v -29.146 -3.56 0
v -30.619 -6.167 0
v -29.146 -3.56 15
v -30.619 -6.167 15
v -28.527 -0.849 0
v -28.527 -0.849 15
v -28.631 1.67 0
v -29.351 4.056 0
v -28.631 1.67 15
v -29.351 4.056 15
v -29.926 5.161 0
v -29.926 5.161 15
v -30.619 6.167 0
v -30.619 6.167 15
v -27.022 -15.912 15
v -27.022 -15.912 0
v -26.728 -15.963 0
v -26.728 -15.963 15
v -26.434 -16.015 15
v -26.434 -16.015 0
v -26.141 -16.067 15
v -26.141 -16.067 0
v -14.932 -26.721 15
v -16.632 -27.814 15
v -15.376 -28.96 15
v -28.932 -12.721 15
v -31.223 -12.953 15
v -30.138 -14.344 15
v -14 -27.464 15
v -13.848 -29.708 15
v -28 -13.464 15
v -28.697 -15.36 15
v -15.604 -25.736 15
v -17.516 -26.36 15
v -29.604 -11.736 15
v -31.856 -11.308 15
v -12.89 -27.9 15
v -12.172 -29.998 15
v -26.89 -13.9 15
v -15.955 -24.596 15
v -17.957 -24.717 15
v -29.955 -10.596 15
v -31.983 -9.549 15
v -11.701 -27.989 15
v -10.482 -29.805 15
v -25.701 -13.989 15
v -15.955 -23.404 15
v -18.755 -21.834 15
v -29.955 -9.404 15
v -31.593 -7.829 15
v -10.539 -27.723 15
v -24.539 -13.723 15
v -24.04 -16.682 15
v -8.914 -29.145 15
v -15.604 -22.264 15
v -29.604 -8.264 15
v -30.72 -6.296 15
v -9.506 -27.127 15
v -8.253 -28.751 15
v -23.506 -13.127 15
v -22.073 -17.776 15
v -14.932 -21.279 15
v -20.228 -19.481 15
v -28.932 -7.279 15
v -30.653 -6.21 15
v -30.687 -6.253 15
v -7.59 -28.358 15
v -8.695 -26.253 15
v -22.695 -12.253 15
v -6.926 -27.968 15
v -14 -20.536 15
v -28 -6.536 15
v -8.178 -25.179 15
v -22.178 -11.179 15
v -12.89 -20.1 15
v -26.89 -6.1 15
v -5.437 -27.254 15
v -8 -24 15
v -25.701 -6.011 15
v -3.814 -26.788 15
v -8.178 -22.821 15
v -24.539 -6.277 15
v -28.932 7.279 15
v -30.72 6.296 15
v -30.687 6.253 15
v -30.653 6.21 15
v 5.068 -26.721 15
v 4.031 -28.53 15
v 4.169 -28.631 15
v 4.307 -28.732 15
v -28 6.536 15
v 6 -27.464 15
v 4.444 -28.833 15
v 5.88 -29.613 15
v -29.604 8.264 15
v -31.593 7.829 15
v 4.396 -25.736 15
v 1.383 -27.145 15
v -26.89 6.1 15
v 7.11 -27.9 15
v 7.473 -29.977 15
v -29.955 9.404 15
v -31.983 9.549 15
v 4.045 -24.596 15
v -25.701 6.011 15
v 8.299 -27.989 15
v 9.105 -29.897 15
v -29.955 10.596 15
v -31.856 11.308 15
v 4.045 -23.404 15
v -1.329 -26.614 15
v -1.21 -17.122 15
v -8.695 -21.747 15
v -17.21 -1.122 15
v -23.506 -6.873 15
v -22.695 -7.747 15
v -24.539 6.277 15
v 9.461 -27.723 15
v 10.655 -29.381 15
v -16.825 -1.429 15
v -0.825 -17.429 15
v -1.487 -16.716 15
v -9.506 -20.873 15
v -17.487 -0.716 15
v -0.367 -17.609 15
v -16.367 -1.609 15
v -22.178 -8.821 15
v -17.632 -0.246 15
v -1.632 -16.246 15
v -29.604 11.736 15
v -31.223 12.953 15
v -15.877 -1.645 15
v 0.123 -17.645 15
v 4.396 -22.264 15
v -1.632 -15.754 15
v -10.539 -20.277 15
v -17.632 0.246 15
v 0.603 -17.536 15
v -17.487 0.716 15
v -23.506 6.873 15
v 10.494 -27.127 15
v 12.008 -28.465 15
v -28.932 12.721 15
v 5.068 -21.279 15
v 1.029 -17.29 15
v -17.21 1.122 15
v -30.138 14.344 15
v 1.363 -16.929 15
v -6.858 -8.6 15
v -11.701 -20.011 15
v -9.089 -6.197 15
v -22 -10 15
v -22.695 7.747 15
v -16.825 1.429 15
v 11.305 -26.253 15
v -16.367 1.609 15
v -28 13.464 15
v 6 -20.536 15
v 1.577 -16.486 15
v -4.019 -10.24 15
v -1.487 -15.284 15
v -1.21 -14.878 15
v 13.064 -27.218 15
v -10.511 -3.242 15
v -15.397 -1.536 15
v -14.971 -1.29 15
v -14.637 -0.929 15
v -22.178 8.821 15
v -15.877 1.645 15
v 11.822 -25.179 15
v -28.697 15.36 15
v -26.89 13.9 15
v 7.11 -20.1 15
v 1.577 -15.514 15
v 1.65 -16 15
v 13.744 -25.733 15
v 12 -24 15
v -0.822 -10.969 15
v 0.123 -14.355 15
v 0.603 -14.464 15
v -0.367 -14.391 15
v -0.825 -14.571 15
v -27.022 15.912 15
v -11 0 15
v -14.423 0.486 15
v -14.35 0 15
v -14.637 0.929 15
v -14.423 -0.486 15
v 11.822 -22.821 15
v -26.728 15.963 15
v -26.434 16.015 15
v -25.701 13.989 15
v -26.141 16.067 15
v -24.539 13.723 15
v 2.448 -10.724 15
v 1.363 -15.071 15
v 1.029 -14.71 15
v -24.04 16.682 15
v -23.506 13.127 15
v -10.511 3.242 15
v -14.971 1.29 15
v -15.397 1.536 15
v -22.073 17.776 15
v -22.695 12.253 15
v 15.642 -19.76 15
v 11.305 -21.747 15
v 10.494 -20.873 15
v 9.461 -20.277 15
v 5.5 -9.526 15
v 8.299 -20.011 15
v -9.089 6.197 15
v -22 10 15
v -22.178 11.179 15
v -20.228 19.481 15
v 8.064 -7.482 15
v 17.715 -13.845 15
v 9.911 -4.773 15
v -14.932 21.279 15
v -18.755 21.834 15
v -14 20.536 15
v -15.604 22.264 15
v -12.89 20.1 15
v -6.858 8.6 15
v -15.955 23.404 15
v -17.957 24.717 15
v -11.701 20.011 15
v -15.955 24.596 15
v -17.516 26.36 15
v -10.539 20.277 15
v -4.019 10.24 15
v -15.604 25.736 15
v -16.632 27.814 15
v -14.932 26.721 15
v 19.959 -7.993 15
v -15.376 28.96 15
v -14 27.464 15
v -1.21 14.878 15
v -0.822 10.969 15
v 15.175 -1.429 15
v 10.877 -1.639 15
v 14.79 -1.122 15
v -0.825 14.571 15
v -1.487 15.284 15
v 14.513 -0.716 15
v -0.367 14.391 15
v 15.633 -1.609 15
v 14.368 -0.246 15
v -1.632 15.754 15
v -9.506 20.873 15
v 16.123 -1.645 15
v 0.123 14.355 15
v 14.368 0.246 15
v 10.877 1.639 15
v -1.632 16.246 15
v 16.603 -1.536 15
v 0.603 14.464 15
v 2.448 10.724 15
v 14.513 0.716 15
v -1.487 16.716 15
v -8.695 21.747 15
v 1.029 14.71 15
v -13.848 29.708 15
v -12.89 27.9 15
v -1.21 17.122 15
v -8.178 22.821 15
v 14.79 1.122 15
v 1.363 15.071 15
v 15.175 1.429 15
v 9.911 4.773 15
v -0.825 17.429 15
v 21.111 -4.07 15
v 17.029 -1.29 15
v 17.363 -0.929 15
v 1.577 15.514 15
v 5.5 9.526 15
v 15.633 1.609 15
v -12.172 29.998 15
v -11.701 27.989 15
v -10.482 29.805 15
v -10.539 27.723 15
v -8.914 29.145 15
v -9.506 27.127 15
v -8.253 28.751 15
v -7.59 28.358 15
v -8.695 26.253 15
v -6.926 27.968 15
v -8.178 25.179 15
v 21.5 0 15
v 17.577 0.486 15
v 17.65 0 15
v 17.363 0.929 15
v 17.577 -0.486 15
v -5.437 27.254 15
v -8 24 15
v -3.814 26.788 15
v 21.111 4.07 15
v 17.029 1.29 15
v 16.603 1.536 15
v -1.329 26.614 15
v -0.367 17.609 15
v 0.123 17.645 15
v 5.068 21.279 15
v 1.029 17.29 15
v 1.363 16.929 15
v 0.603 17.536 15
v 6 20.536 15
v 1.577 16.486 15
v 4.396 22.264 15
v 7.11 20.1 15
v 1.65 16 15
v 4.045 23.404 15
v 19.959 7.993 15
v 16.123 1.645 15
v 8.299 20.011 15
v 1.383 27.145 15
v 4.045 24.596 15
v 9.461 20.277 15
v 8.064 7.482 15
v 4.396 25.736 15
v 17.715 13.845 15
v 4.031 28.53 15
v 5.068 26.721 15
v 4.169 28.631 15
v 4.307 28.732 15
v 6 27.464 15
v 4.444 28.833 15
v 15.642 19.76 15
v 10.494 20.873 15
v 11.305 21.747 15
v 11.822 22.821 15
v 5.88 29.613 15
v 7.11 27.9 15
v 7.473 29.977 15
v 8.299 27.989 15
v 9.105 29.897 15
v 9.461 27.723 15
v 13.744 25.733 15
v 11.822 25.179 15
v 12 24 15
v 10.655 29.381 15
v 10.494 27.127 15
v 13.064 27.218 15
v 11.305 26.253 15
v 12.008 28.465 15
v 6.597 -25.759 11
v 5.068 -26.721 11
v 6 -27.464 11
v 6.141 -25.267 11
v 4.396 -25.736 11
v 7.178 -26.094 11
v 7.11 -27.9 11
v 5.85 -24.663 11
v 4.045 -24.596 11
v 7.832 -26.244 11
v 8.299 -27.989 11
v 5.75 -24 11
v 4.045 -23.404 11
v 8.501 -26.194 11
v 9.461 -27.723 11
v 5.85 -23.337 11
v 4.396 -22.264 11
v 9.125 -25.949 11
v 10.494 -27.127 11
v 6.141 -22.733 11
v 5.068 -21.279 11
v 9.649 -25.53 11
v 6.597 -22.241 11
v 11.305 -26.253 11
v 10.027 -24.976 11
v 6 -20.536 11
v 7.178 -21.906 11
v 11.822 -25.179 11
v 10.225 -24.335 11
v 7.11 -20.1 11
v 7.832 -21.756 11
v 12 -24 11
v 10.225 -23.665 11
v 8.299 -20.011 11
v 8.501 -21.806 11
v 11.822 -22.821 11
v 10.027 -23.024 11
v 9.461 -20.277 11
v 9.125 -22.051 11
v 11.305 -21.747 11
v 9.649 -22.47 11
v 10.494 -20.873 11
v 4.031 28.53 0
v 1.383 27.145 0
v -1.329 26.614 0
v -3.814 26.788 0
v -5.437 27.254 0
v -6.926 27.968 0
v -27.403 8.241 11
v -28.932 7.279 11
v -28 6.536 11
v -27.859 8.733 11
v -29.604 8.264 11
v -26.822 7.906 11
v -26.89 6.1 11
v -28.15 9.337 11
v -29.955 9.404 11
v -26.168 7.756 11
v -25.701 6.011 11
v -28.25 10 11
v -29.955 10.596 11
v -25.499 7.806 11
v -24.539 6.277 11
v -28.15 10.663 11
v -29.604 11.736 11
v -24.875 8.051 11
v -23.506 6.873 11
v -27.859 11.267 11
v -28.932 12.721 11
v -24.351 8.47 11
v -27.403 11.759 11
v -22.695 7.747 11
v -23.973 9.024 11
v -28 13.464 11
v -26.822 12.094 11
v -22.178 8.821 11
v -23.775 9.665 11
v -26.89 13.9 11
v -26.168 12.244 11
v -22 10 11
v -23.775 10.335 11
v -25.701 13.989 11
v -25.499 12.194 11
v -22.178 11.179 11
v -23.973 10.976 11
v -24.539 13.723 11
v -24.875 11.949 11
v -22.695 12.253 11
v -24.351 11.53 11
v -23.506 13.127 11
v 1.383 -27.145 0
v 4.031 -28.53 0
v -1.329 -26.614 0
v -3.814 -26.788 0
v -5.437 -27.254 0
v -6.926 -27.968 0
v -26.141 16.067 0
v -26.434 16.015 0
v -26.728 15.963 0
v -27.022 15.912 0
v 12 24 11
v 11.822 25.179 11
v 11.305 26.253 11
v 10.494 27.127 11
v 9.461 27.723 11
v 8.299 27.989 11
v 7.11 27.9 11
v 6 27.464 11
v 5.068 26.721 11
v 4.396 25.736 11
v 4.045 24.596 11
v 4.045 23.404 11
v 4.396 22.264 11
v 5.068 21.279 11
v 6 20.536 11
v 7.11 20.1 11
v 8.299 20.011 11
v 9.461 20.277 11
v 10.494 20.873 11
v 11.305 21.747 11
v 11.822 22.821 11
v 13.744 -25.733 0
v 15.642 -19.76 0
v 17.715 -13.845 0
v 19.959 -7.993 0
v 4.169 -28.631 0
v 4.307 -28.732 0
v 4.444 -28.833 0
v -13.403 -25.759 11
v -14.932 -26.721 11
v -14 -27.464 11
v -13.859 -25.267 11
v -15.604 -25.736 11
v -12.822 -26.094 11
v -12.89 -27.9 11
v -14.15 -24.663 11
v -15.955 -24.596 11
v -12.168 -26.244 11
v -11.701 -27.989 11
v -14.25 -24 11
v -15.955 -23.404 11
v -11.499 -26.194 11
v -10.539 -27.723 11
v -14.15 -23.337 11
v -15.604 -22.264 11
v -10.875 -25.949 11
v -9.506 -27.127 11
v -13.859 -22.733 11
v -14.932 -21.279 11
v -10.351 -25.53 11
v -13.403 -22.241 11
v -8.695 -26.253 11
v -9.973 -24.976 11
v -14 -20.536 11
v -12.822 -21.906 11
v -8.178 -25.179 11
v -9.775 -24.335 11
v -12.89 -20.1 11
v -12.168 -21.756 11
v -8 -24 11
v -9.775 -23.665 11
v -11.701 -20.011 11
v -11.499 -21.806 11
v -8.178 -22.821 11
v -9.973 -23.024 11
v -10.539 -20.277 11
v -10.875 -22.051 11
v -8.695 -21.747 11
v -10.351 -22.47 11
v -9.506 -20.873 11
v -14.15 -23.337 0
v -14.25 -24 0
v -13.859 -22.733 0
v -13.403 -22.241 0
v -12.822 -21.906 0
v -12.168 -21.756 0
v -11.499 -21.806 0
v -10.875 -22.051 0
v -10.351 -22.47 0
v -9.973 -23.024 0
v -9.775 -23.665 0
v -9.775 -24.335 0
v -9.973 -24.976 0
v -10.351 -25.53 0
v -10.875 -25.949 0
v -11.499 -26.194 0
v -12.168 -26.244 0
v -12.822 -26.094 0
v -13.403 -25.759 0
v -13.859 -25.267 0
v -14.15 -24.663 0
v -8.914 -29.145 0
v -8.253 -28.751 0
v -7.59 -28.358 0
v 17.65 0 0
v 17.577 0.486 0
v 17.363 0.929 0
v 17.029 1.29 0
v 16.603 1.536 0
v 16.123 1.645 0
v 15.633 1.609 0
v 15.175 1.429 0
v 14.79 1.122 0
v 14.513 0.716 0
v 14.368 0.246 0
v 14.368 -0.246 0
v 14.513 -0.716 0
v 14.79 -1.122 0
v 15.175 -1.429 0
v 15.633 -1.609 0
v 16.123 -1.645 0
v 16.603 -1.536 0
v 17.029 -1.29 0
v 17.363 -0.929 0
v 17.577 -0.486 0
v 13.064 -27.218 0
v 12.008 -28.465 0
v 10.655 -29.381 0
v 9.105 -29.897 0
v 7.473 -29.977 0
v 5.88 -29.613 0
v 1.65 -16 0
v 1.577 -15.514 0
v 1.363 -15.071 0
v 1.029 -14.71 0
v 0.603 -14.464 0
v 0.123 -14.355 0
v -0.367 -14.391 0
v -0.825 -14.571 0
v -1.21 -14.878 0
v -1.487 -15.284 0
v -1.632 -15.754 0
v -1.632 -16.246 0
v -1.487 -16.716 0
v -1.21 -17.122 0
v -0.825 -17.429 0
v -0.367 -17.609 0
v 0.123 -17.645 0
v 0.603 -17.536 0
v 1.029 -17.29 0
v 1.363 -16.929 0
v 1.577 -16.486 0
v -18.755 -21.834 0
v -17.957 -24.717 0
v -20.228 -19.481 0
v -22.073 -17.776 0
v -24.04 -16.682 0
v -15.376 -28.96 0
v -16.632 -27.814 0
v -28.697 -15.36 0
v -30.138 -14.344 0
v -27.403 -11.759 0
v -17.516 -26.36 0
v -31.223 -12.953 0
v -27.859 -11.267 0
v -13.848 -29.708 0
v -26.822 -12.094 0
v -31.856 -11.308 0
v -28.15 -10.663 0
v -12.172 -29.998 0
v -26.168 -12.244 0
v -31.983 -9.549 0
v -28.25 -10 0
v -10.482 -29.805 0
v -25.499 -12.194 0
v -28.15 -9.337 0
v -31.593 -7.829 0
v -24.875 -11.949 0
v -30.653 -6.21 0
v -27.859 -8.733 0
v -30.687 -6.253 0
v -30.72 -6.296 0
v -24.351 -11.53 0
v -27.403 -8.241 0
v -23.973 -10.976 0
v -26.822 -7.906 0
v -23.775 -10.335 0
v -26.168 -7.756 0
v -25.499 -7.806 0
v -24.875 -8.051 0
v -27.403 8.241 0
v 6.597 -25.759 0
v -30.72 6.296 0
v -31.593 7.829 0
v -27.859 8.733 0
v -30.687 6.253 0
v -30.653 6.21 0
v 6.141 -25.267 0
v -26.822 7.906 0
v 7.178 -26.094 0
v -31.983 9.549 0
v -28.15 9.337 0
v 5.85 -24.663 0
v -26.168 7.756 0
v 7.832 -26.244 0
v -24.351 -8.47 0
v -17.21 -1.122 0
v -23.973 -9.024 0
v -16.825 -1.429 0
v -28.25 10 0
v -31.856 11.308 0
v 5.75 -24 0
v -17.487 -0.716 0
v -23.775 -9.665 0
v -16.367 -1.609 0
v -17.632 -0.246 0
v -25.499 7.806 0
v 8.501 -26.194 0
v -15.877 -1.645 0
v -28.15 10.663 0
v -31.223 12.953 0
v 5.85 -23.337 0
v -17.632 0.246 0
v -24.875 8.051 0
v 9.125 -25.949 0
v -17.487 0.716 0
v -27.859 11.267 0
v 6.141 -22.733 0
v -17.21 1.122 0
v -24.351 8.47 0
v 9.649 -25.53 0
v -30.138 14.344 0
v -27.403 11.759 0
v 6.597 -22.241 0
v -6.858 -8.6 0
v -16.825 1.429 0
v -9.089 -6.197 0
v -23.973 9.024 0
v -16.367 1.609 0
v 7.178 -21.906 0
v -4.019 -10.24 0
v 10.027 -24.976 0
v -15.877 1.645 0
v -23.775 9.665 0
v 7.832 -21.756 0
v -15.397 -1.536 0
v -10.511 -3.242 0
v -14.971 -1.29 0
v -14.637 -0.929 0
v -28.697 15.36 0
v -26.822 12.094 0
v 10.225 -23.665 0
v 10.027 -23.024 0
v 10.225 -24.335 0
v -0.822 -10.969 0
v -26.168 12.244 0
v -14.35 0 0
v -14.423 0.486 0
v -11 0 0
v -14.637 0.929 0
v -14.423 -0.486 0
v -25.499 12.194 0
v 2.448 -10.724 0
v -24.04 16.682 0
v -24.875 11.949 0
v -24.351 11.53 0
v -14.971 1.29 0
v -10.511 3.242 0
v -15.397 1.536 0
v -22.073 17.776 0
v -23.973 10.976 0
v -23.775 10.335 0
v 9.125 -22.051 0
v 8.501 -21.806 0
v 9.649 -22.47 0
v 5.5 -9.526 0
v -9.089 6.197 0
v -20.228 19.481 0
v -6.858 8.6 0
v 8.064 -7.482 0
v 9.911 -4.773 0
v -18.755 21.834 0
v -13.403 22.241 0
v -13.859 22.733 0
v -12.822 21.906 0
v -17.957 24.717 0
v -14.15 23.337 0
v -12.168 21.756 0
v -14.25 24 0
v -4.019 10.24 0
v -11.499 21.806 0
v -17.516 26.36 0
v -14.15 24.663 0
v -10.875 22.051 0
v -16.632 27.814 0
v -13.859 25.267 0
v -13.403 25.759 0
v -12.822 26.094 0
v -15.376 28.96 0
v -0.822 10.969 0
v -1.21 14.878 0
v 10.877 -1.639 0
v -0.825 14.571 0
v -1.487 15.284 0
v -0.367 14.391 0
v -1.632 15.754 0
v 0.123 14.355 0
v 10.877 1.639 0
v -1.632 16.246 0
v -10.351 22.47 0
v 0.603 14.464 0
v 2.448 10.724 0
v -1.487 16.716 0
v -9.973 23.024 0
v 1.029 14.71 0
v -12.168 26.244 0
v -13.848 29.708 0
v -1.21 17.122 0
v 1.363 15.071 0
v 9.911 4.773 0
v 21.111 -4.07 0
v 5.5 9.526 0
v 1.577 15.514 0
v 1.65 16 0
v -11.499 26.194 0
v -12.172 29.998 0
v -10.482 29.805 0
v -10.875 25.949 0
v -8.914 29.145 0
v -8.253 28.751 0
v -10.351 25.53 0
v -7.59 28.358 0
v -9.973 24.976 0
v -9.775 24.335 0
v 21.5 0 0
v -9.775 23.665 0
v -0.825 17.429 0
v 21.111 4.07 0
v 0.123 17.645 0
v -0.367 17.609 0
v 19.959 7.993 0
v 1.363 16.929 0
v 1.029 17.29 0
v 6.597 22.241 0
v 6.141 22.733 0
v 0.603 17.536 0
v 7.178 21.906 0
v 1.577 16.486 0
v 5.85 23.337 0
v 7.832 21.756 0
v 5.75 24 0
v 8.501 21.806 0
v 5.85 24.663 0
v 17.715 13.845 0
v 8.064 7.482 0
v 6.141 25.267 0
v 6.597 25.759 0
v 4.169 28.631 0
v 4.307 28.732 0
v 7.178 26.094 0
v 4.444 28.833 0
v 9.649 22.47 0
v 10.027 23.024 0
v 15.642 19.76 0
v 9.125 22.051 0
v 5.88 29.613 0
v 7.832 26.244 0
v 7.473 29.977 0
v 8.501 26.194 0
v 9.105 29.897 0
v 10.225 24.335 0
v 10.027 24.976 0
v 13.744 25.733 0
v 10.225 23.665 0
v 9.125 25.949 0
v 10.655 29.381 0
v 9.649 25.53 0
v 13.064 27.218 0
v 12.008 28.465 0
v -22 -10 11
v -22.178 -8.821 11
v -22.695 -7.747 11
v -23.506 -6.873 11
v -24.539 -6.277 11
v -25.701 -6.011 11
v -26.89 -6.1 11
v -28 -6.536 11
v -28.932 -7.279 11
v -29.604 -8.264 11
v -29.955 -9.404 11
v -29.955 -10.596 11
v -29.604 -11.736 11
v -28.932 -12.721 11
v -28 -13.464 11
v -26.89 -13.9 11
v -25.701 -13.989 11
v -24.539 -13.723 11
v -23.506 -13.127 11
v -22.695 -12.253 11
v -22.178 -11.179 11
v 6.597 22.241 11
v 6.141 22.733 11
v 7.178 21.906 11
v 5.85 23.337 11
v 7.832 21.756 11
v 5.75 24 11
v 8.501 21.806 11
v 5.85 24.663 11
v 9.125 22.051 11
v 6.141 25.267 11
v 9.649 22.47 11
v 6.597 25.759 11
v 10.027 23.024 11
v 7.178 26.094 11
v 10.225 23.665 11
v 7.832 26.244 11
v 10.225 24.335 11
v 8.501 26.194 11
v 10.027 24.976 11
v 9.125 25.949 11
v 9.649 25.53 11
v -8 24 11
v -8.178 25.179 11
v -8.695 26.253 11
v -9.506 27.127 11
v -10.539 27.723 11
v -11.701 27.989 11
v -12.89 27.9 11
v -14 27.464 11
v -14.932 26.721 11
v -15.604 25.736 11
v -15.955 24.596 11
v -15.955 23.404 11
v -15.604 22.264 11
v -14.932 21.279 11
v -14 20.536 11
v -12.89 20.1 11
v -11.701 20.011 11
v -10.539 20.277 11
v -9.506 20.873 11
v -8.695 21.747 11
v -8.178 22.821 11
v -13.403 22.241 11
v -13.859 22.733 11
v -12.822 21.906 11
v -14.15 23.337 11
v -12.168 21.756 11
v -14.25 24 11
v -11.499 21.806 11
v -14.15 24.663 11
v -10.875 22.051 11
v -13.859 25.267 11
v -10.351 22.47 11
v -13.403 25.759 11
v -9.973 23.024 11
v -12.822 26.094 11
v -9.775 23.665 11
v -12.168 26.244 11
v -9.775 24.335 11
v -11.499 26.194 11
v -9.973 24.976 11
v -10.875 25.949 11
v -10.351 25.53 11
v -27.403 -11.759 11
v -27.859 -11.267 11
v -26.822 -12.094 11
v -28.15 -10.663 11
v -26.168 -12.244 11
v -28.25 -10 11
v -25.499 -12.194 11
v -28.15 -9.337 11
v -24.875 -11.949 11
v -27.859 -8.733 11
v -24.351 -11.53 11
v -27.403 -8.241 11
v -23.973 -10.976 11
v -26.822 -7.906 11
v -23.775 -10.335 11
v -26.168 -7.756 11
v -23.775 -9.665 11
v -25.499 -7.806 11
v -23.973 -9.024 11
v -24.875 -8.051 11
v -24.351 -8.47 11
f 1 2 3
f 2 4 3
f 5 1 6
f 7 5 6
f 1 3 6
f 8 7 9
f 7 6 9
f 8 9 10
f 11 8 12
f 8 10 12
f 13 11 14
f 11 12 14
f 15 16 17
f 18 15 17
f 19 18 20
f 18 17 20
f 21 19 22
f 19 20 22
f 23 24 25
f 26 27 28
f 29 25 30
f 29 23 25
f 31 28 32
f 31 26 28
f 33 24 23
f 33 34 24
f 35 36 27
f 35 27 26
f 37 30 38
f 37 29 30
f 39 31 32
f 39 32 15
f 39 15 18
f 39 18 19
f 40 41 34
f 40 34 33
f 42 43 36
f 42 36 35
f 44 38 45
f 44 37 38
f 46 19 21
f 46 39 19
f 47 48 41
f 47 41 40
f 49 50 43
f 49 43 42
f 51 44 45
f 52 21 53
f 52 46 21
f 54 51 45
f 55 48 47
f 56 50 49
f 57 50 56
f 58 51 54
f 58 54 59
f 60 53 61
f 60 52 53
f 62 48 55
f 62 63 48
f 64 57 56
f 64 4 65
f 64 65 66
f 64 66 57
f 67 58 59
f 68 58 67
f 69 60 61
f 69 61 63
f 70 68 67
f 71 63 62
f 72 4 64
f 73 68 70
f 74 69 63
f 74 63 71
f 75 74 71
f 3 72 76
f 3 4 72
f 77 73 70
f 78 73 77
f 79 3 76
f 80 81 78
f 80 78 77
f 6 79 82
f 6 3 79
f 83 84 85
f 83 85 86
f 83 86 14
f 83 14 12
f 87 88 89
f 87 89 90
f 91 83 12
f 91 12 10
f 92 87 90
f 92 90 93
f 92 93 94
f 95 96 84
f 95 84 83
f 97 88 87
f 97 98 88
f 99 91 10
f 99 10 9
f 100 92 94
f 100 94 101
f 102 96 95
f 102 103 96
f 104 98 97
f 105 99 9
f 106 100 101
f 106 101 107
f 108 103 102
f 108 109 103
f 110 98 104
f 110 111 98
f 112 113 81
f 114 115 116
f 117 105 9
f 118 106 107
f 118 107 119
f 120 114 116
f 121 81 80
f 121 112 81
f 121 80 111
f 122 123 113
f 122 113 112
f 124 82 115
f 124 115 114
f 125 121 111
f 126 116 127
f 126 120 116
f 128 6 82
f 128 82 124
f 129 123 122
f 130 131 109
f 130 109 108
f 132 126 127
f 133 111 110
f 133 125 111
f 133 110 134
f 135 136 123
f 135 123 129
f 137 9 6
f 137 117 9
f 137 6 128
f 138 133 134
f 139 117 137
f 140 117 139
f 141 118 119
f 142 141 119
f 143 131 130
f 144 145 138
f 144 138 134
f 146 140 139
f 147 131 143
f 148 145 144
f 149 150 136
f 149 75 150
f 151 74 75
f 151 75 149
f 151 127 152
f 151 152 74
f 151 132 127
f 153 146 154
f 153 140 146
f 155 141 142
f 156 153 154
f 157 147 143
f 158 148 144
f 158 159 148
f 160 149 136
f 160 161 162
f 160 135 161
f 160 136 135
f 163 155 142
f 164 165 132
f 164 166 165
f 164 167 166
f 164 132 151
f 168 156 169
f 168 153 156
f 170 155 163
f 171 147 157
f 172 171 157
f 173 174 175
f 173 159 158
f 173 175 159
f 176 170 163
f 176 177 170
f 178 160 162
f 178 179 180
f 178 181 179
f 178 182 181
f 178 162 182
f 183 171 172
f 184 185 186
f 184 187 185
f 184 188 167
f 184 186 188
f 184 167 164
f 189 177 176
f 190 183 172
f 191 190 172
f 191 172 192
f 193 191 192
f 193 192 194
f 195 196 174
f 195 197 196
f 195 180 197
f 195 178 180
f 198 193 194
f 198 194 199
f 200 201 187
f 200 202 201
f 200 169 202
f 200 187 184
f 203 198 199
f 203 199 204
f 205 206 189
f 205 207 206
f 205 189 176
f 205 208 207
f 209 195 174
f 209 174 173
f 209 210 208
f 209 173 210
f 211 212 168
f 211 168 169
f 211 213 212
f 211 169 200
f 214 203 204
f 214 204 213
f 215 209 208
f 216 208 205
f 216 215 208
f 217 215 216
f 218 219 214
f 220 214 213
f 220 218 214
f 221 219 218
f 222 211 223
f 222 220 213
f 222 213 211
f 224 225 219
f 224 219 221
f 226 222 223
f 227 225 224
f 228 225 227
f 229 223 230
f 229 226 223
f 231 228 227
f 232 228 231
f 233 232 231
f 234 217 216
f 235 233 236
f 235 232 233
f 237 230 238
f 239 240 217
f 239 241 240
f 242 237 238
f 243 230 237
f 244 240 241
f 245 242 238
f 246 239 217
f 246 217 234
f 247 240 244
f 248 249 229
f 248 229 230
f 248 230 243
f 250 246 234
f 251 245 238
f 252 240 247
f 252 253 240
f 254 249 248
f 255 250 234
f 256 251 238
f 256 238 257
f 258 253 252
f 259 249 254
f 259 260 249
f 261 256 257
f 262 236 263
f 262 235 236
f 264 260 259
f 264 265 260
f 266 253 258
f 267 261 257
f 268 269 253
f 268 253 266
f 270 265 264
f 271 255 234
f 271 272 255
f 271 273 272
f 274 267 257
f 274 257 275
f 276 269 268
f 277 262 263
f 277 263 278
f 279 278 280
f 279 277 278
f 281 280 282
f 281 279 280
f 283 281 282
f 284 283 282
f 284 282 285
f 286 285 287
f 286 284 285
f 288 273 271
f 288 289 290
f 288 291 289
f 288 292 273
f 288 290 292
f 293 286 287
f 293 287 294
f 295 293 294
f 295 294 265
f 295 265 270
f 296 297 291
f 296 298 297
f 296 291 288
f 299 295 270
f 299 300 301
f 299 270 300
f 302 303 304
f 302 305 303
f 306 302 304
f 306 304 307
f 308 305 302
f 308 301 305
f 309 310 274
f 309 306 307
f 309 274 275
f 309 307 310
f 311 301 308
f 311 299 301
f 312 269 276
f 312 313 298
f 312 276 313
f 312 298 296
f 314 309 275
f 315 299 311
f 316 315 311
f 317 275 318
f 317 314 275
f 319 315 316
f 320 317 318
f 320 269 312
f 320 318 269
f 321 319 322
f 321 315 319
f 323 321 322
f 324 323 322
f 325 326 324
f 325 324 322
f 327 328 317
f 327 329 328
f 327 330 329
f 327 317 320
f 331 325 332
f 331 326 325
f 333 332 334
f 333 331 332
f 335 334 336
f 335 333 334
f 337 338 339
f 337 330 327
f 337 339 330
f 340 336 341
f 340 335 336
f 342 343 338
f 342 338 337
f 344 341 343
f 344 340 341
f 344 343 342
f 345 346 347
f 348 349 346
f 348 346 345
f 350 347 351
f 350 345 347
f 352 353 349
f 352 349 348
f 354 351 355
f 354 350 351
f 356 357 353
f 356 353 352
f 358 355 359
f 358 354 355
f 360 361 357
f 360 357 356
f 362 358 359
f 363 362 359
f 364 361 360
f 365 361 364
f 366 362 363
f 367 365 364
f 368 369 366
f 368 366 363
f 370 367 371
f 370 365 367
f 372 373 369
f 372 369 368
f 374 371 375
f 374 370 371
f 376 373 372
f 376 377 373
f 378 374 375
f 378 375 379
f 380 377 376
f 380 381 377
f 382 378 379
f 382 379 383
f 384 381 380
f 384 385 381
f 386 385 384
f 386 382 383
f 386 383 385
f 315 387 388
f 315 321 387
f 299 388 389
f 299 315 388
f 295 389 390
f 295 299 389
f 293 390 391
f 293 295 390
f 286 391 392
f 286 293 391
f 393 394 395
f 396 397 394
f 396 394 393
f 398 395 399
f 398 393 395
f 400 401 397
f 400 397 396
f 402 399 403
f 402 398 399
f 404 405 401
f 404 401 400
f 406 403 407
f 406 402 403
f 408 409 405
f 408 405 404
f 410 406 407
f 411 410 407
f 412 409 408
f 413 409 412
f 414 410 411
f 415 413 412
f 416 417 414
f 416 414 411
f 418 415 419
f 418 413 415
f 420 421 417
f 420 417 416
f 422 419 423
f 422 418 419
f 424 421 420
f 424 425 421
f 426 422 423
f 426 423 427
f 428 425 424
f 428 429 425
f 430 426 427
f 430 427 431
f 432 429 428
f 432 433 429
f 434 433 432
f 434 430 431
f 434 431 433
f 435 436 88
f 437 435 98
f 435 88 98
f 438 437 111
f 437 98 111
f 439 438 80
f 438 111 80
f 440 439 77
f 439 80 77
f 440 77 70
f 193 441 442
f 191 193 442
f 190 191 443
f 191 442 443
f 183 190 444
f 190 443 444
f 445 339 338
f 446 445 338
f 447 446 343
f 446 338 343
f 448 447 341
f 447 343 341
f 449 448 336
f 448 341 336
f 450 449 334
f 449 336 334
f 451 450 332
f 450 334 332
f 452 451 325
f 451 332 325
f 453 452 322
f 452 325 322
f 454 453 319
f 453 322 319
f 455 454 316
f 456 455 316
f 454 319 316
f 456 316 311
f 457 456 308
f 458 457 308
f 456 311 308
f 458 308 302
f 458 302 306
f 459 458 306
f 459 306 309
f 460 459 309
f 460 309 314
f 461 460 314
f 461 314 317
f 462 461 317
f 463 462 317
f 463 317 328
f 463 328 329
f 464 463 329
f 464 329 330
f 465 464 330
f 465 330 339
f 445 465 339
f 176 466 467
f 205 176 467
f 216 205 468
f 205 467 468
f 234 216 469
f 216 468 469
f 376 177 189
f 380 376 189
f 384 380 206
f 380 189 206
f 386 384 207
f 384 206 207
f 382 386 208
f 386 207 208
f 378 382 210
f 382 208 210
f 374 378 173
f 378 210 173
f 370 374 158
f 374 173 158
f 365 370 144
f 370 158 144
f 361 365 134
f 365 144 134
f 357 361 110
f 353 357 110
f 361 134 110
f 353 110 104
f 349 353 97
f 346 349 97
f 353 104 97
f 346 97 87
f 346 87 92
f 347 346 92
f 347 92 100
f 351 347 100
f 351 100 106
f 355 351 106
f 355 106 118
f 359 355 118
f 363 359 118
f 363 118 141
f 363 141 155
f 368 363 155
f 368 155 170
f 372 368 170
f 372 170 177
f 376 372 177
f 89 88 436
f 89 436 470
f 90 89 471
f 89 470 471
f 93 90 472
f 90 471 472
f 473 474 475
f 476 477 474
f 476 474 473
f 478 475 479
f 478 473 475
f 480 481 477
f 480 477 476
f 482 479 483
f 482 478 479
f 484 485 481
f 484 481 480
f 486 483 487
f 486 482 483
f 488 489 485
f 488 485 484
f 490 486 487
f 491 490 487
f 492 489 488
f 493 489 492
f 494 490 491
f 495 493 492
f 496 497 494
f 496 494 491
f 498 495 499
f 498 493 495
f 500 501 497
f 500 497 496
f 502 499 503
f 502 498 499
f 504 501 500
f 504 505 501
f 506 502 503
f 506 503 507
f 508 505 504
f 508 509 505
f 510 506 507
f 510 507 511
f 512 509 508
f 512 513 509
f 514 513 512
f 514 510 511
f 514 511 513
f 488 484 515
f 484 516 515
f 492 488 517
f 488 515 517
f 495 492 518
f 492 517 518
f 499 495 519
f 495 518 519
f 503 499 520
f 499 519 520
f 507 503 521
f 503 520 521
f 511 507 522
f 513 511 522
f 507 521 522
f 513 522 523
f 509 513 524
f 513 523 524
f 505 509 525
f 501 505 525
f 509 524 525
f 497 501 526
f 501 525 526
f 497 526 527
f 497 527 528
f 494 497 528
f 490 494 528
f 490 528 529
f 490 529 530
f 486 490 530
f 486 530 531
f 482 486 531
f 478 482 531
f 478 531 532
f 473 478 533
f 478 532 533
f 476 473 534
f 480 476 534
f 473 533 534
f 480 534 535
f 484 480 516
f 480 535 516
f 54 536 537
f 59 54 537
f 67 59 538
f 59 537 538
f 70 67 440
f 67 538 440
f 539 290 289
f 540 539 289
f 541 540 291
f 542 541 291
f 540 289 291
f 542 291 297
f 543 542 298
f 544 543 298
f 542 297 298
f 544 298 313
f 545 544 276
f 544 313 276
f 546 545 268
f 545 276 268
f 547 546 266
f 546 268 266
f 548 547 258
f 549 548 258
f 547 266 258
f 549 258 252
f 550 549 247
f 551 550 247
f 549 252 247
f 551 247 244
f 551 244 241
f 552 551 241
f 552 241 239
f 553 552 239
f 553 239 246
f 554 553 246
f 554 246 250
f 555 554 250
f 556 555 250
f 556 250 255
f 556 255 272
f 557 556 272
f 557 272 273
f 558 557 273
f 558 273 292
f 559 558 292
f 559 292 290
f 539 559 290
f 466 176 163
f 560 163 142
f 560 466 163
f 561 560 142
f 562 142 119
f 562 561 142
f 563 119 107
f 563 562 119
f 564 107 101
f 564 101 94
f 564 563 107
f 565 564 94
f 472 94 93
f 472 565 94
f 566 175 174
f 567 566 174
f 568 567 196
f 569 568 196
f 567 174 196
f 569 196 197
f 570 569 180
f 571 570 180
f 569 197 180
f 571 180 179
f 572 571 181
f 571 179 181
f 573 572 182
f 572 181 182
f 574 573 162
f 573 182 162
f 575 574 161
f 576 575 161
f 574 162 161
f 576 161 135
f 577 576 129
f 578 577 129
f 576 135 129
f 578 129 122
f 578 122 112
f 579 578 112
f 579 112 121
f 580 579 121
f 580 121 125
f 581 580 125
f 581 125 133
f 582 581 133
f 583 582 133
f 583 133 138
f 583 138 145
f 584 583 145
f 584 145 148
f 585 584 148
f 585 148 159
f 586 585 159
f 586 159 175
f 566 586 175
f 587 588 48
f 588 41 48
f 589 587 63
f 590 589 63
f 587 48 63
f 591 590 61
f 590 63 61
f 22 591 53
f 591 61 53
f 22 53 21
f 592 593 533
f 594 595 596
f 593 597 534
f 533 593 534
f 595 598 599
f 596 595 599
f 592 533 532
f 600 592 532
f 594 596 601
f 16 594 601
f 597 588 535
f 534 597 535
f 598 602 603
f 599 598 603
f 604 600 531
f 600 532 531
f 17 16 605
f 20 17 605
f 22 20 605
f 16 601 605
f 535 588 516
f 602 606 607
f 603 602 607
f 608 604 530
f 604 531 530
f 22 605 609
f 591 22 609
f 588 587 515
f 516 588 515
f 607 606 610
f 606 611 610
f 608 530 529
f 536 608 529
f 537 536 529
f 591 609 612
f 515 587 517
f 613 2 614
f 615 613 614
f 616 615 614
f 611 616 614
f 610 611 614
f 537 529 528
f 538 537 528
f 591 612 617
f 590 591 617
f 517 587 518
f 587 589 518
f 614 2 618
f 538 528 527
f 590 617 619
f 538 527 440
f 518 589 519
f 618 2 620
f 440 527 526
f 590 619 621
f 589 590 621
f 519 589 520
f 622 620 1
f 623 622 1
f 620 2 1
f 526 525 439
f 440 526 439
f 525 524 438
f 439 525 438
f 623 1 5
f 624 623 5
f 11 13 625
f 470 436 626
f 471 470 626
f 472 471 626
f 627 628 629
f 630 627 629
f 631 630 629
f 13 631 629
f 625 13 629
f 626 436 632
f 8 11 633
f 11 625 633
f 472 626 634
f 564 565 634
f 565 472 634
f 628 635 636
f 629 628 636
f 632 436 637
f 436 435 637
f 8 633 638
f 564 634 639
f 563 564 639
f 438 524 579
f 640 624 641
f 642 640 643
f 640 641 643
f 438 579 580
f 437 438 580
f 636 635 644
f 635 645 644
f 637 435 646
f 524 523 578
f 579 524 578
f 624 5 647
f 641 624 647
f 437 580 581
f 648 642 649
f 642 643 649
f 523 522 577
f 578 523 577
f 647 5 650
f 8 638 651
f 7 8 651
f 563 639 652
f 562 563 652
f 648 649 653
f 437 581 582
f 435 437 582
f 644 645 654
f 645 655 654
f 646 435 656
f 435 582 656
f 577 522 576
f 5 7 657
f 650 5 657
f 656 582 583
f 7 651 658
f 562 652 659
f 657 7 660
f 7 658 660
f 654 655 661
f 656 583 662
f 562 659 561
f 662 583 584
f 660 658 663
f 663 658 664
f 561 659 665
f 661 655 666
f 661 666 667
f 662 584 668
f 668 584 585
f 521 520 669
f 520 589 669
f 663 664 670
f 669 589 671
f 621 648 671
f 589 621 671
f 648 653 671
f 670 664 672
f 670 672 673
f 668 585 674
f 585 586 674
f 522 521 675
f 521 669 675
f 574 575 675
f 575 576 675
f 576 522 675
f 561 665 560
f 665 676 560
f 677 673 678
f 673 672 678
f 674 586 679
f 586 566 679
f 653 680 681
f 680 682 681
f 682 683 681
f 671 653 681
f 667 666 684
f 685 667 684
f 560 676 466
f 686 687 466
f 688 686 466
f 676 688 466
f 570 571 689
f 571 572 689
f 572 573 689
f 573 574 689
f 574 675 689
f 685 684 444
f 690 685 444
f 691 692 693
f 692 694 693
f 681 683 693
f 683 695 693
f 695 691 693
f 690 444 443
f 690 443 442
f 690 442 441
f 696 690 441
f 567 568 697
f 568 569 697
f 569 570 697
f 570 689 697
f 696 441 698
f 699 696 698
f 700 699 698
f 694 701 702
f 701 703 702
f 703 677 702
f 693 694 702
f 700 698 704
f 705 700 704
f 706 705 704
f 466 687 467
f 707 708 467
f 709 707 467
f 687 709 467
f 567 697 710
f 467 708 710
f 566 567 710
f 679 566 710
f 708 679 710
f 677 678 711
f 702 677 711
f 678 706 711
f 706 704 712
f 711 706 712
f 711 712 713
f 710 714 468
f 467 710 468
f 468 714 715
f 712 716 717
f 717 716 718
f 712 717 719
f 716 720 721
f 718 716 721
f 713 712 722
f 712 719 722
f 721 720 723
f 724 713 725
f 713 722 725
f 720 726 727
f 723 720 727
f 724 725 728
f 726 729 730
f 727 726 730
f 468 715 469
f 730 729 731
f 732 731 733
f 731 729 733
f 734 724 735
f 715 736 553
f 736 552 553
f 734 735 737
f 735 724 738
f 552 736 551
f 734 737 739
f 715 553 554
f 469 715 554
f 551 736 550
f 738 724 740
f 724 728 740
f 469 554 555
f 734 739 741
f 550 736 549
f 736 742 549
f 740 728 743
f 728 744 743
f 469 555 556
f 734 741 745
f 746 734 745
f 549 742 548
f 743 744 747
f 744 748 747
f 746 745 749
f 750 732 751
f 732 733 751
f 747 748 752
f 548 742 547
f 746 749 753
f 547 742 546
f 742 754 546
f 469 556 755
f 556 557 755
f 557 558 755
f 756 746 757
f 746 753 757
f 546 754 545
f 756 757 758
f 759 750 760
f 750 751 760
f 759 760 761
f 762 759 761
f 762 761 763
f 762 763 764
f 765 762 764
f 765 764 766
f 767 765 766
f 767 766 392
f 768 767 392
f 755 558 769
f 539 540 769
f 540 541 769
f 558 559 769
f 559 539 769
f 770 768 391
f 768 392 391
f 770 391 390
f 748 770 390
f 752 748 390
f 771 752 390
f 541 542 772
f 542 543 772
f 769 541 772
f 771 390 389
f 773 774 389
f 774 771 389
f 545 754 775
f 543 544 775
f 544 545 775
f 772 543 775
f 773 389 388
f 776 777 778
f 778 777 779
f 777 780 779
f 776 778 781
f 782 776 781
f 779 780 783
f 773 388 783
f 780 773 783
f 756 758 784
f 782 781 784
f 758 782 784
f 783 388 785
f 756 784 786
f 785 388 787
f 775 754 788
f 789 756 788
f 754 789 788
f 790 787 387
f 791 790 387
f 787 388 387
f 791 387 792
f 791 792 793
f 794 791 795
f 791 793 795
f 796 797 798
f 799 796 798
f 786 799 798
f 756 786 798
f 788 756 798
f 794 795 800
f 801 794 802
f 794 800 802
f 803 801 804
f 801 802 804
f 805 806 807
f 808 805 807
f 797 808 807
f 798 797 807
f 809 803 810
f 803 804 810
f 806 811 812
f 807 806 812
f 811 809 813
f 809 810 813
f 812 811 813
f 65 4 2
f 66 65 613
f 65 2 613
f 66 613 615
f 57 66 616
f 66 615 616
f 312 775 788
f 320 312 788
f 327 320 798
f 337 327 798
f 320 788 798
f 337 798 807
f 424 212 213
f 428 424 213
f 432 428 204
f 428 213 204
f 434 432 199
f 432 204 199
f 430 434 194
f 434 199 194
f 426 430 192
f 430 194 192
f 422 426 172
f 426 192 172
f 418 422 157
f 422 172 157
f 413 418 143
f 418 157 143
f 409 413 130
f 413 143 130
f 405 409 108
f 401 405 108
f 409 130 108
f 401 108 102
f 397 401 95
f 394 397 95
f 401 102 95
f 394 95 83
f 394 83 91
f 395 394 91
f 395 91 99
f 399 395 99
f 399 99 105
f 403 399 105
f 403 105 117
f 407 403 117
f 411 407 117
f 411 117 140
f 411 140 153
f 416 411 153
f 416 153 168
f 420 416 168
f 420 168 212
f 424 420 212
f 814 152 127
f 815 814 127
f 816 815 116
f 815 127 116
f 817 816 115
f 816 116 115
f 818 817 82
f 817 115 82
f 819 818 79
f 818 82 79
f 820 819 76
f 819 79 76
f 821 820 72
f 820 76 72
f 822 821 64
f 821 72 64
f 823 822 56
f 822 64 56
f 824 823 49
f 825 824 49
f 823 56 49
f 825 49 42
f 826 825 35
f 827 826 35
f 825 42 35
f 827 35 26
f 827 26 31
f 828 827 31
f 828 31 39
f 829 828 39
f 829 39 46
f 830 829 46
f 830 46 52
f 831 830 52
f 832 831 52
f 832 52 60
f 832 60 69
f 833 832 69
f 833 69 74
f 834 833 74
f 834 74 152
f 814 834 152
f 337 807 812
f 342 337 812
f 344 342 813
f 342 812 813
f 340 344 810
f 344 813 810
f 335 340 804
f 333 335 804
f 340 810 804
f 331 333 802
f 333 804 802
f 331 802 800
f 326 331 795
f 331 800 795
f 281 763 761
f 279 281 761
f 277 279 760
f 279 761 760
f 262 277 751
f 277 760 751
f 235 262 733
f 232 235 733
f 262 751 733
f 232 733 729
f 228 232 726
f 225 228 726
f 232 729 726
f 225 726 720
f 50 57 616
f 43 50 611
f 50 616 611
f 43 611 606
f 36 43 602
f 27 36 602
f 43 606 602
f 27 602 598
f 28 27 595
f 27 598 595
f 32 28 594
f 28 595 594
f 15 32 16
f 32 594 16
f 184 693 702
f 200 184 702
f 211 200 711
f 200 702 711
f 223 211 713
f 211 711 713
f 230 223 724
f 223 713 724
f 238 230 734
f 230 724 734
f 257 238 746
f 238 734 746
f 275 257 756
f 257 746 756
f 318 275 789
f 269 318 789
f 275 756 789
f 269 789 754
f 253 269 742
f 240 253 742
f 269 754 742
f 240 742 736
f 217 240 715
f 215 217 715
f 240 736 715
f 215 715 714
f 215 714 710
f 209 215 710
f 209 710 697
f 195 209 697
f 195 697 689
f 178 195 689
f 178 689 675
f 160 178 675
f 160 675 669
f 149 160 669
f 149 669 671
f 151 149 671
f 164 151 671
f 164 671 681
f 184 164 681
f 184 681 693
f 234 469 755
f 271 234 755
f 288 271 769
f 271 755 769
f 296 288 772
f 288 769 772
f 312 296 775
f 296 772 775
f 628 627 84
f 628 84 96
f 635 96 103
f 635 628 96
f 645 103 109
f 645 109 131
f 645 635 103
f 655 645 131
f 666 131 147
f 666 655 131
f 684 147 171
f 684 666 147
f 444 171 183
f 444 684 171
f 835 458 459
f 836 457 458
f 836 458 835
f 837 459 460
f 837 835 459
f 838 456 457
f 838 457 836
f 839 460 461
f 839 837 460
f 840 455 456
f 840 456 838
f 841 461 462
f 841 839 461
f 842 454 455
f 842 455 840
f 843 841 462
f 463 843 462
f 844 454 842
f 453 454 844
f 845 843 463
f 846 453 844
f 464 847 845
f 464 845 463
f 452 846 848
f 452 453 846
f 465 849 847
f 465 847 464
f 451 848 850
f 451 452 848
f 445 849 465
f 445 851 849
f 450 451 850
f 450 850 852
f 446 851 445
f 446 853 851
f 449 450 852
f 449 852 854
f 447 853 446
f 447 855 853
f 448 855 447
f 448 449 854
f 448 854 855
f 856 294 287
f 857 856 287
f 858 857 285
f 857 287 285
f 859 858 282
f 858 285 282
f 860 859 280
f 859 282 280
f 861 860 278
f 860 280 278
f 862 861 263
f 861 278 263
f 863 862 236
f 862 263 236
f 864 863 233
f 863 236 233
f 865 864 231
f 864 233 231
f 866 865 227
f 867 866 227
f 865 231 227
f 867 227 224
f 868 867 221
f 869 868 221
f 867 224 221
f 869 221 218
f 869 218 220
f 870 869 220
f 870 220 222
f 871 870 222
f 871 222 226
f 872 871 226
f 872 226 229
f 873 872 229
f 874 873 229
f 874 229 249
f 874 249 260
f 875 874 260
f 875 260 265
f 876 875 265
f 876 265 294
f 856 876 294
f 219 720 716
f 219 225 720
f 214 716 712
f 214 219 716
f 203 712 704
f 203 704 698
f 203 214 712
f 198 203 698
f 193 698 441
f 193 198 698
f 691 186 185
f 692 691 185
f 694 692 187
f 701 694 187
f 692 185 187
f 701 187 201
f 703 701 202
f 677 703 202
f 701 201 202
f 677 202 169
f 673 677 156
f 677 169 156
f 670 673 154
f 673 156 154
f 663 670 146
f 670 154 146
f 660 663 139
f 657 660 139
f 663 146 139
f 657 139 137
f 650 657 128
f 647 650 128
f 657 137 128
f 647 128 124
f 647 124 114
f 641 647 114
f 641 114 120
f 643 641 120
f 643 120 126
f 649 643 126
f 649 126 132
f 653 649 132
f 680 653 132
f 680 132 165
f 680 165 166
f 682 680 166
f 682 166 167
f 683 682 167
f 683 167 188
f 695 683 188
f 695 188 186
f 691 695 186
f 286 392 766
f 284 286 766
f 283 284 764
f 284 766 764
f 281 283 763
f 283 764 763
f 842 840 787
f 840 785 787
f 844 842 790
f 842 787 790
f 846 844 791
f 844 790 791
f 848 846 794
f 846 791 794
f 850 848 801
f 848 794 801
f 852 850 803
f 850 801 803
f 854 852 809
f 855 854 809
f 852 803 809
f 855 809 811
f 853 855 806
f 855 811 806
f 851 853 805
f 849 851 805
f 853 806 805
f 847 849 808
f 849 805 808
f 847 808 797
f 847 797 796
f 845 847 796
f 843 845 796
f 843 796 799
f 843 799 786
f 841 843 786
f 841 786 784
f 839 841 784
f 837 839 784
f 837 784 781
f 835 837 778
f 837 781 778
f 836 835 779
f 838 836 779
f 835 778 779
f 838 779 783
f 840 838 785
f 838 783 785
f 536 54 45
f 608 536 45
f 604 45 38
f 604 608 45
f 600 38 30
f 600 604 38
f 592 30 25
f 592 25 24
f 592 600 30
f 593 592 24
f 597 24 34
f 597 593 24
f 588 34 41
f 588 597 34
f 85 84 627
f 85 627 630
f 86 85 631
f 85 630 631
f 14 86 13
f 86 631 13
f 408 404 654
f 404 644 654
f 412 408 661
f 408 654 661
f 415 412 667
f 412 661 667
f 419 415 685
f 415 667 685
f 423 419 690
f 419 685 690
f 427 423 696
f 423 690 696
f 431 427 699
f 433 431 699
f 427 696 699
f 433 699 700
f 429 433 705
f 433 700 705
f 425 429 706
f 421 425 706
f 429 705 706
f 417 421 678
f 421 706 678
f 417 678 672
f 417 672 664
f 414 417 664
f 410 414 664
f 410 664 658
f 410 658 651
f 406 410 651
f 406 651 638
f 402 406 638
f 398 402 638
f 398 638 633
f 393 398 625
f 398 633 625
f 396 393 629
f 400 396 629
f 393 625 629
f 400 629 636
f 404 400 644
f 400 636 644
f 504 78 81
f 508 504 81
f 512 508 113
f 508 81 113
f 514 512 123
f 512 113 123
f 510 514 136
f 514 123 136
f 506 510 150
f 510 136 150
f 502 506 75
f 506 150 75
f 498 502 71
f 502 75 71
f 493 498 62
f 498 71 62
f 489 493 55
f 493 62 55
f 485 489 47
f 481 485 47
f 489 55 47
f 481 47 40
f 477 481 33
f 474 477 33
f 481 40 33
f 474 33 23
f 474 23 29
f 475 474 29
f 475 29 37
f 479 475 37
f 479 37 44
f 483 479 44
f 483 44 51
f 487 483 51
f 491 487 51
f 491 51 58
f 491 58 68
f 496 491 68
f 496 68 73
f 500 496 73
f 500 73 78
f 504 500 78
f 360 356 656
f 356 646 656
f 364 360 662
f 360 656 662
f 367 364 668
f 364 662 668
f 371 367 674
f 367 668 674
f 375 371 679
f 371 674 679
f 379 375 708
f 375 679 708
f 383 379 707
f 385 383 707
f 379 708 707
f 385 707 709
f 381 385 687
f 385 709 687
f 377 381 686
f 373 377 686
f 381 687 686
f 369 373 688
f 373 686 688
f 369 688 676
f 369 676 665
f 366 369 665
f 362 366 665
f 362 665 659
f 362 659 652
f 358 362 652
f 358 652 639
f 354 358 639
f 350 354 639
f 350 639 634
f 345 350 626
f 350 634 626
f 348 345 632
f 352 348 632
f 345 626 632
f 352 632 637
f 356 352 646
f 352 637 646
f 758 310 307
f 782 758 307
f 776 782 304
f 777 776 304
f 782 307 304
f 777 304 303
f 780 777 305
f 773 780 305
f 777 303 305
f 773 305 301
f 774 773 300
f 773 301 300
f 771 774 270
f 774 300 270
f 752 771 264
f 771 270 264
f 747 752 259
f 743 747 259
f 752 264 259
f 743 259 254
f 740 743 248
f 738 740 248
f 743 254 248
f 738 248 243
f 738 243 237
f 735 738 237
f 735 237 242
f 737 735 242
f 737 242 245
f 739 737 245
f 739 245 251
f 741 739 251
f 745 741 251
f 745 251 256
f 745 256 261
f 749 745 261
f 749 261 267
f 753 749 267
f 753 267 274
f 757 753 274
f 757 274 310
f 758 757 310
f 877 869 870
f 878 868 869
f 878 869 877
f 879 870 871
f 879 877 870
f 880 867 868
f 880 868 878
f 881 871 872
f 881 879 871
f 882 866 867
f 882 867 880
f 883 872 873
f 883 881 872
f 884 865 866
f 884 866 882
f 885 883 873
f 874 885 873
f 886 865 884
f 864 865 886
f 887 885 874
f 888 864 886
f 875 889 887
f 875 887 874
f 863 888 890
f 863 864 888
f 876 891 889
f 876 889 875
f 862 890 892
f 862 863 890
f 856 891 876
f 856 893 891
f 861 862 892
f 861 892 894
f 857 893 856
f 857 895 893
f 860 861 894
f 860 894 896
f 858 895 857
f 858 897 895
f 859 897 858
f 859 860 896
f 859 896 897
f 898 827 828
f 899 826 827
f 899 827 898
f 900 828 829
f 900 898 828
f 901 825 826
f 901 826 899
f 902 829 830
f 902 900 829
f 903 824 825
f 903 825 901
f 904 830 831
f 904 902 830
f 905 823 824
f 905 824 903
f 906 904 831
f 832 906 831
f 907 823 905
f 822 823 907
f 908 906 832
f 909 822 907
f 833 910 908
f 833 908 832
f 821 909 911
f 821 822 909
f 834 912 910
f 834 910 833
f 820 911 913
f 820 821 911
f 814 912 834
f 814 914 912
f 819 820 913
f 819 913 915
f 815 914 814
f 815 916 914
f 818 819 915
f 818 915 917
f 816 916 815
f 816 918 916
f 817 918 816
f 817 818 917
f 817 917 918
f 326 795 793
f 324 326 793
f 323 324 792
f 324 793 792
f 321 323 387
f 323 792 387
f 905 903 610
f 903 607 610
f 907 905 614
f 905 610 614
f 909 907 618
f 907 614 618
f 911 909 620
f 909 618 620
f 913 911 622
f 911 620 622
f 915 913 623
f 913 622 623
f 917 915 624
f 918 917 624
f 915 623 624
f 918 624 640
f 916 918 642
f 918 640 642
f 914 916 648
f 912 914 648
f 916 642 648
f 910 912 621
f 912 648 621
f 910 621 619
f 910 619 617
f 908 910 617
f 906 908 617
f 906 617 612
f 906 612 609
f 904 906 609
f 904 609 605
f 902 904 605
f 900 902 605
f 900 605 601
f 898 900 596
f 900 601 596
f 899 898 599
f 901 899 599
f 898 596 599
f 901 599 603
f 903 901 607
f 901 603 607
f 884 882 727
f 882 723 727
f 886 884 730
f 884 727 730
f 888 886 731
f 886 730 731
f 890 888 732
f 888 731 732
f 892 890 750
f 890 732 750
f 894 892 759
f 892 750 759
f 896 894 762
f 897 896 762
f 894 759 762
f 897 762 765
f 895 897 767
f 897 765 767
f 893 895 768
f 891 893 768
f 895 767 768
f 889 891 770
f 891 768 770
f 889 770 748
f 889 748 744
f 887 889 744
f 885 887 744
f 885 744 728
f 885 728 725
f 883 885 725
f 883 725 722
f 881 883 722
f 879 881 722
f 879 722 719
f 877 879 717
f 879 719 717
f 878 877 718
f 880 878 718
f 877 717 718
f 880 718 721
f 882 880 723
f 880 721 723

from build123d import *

# Parameters (mm, degrees)
SKETCH1_R                      = 21.5
BOSS_EXTRUDE1_DEPTH            = 15
TAP_DRILL_FOR_M4X0_7_TAP1_D    = 3.3
BOSS_EXTRUDE2_DEPTH            = 15
SKETCH6_R                      = 11
CUT_EXTRUDE1_DEPTH             = 47.357307946
FILLET1_DEPTH                  = 15
FILLET2_R                      = 10
CBORE_FOR_M4_SHCS2_D           = 4.5
CBORE_FOR_M4_SHCS2_CBORE_D     = 8
CBORE_FOR_M4_SHCS2_CBORE_DEPTH = 4


with BuildPart() as part:
    # Sketch1 → Boss-Extrude1 (new body)
    with BuildSketch(Plane.XY):
        Circle(SKETCH1_R)
    extrude(amount=BOSS_EXTRUDE1_DEPTH)

    # Tap Drill for M4x0.7 Tap1 (through all)
    with Locations(Plane(origin=(0, 0, 0), x_dir=(-1, 0, 0), z_dir=(0, 0, -1))):
        with Locations((0, 16), (16, 0), (0, -16), (-16, 0)):
            Hole(TAP_DRILL_FOR_M4X0_7_TAP1_D / 2)

    # Sketch3 → Boss-Extrude2 (add)
    with BuildSketch(Plane(origin=(0, 0, 0), x_dir=(-1, 0, 0), z_dir=(0, 0, -1))):
        with BuildLine():
            Line((-2.307900214, 25.897366597), (-0.836682642, 21.483713882))
            ThreePointArc((-0.836682642, 21.483713882), (-6.798896971, 20.396690908), (-12.220882218, 17.688980689))
            Line((-12.220882218, 17.688980689), (-13.69209979, 22.102633403))
            ThreePointArc((-13.69209979, 22.102633403), (-9.897366599, 29.692099788), (-2.307900214, 25.897366597))
        make_face()
        with BuildLine():
            Line((17.366563149, 21.316718426), (14.599655804, 15.782903738))
            ThreePointArc((14.599655804, 15.782903738), (9.615092305, 19.230184606), (3.866529512, 21.149466885))
            Line((3.866529512, 21.149466885), (6.633436857, 26.683281574))
            ThreePointArc((6.633436857, 26.683281574), (14.683281576, 29.366563146), (17.366563149, 21.316718426))
        make_face()
        with BuildLine():
            Line((23.846125524, 15.600073637), (17.115813542, 13.011492105))
            ThreePointArc((17.115813542, 13.011492105), (20.066930533, 7.718050205), (21.423562493, 1.811344831))
            Line((21.423562493, 1.811344831), (28.153874476, 4.399926363))
            ThreePointArc((28.153874476, 4.399926363), (31.600073637, 12.153874476), (23.846125524, 15.600073637))
        make_face()
        with BuildLine():
            Line((23.846125524, -15.600073637), (17.115813542, -13.011492105))
            ThreePointArc((17.115813542, -13.011492105), (20.066930533, -7.718050205), (21.423562493, -1.811344831))
            Line((21.423562493, -1.811344831), (28.153874476, -4.399926363))
            ThreePointArc((28.153874476, -4.399926363), (31.600073637, -12.153874476), (23.846125524, -15.600073637))
        make_face()
        with BuildLine():
            Line((17.366563149, -21.316718426), (14.599655804, -15.782903738))
            ThreePointArc((14.599655804, -15.782903738), (9.615092305, -19.230184606), (3.866529512, -21.149466885))
            Line((3.866529512, -21.149466885), (6.633436857, -26.683281574))
            ThreePointArc((6.633436857, -26.683281574), (14.683281576, -29.366563146), (17.366563149, -21.316718426))
        make_face()
        with BuildLine():
            Line((-2.307900214, -25.897366597), (-0.836682642, -21.483713882))
            ThreePointArc((-0.836682642, -21.483713882), (-6.798896971, -20.396690908), (-12.220882218, -17.688980689))
            Line((-12.220882218, -17.688980689), (-13.69209979, -22.102633403))
            ThreePointArc((-13.69209979, -22.102633403), (-9.897366599, -29.692099788), (-2.307900214, -25.897366597))
        make_face()
    extrude(amount=-BOSS_EXTRUDE2_DEPTH)

    # Sketch6 → Cut-Extrude1 (cut, through all)
    with BuildSketch(Plane(origin=(0, 0, 0), x_dir=(-1, 0, 0), z_dir=(0, 0, -1))):
        Circle(SKETCH6_R)
    extrude(amount=-CUT_EXTRUDE1_DEPTH, mode=Mode.SUBTRACT)

    # Fillet1: read off the stored shape, not the designer's step
    # Fillet1 outline → Fillet1 (add)
    with BuildSketch(Plane.XY):
        with BuildLine():
            ThreePointArc((13.744239295, -25.733122887), (16.656803279, -16.794634864), (19.959130827, -7.9926902))
            ThreePointArc((19.959130827, -7.9926902), (16.804547664, -13.411084139), (12.220882218, -17.688980689))
            Line((12.220882218, -17.688980689), (13.69209979, -22.102633403))
            ThreePointArc((13.69209979, -22.102633403), (13.999381334, -23.913839504), (13.744239295, -25.733122887))
        make_face()
        with BuildLine():
            ThreePointArc((12.220882218, 17.688980689), (16.804547664, 13.411084139), (19.959130827, 7.9926902))
            ThreePointArc((19.959130827, 7.9926902), (16.656803279, 16.794634864), (13.744239295, 25.733122887))
            ThreePointArc((13.744239295, 25.733122887), (13.999381334, 23.913839504), (13.69209979, 22.102633403))
            Line((13.69209979, 22.102633403), (12.220882218, 17.688980689))
        make_face()
        with BuildLine():
            ThreePointArc((-1.269568391, -24.771937297), (1.604087257, -26.779090443), (4.4444823, -28.833041886))
            ThreePointArc((4.4444823, -28.833041886), (3.148798639, -27.530700404), (2.307900214, -25.897366597))
            Line((2.307900214, -25.897366597), (0.836682642, -21.483713882))
            ThreePointArc((0.836682642, -21.483713882), (-1.524113932, -21.445910489), (-3.866529512, -21.149466885))
            Line((-3.866529512, -21.149466885), (-6.633436857, -26.683281574))
            ThreePointArc((-6.633436857, -26.683281574), (-7.59800708, -28.077064913), (-8.913884182, -29.145472684))
            ThreePointArc((-8.913884182, -29.145472684), (-5.114227359, -26.919376327), (-1.269568391, -24.771937297))
        make_face()
        with BuildLine():
            ThreePointArc((2.307900214, 25.897366597), (3.148798639, 27.530700404), (4.4444823, 28.833041886))
            ThreePointArc((4.4444823, 28.833041886), (1.604087257, 26.779090443), (-1.269568391, 24.771937297))
            ThreePointArc((-1.269568391, 24.771937297), (-5.114227359, 26.919376327), (-8.913884182, 29.145472684))
            ThreePointArc((-8.913884182, 29.145472684), (-7.59800708, 28.077064913), (-6.633436857, 26.683281574))
            Line((-6.633436857, 26.683281574), (-3.866529512, 21.149466885))
            ThreePointArc((-3.866529512, 21.149466885), (-1.524113932, 21.445910489), (0.836682642, 21.483713882))
            Line((0.836682642, 21.483713882), (2.307900214, 25.897366597))
        make_face()
        with BuildLine():
            ThreePointArc((-18.827219, -17.493972554), (-18.367768434, -21.052580188), (-17.968047643, -24.618390952))
            ThreePointArc((-17.968047643, -24.618390952), (-17.902847687, -22.924644608), (-17.366563149, -21.316718426))
            Line((-17.366563149, -21.316718426), (-14.599655804, -15.782903738))
            ThreePointArc((-14.599655804, -15.782903738), (-15.918163511, -14.452061114), (-17.115813542, -13.011492105))
            Line((-17.115813542, -13.011492105), (-23.846125524, -15.600073637))
            ThreePointArc((-23.846125524, -15.600073637), (-25.412904992, -15.971207537), (-27.021964079, -15.912325213))
            ThreePointArc((-27.021964079, -15.912325213), (-22.91688029, -16.663195777), (-18.827219, -17.493972554))
        make_face()
        with BuildLine():
            ThreePointArc((-17.366563149, 21.316718426), (-17.902847687, 22.924644608), (-17.968047643, 24.618390952))
            ThreePointArc((-17.968047643, 24.618390952), (-18.367768434, 21.052580188), (-18.827219, 17.493972554))
            ThreePointArc((-18.827219, 17.493972554), (-22.91688029, 16.663195777), (-27.021964079, 15.912325213))
            ThreePointArc((-27.021964079, 15.912325213), (-25.412904992, 15.971207537), (-23.846125524, 15.600073637))
            Line((-23.846125524, 15.600073637), (-17.115813542, 13.011492105))
            ThreePointArc((-17.115813542, 13.011492105), (-15.918163511, 14.452061114), (-14.599655804, 15.782903738))
            Line((-14.599655804, 15.782903738), (-17.366563149, 21.316718426))
        make_face()
        with BuildLine():
            ThreePointArc((-25.965184624, 0), (-28.313790974, -3.170063395), (-30.720438686, -6.296291235))
            ThreePointArc((-30.720438686, -6.296291235), (-29.565542777, -5.174349297), (-28.153874476, -4.399926363))
            Line((-28.153874476, -4.399926363), (-21.423562493, -1.811344831))
            ThreePointArc((-21.423562493, -1.811344831), (-21.5, 0), (-21.423562493, 1.811344831))
            Line((-21.423562493, 1.811344831), (-28.153874476, 4.399926363))
            ThreePointArc((-28.153874476, 4.399926363), (-29.565542777, 5.174349297), (-30.720438686, 6.296291235))
            ThreePointArc((-30.720438686, 6.296291235), (-28.313790974, 3.170063395), (-25.965184624, 0))
        make_face()
    extrude(amount=FILLET1_DEPTH)

    # Fillet2
    fillet2_edges = [part.edges().sort_by_distance(p)[0] for p in [
        (-1.269568391, -24.771937297, 7.5),
        (-18.827219, -17.493972554, 7.5),
        (-25.965184624, 0, 7.5),
        (-18.827219, 17.493972554, 7.5),
        (-1.269568391, 24.771937297, 7.5),
    ]]
    fillet(fillet2_edges, radius=FILLET2_R)

    # CBORE for M4 SHCS2 (through all)
    with Locations(Plane.XY.offset(15)):
        with Locations((8.000000002, 24), (-12.000000003, 24), (-26, 10), (-26, -10), (-12.000000003, -24), (8.000000002, -24)):
            CounterBoreHole(CBORE_FOR_M4_SHCS2_D / 2, CBORE_FOR_M4_SHCS2_CBORE_D / 2, CBORE_FOR_M4_SHCS2_CBORE_DEPTH)


solid = part.part
